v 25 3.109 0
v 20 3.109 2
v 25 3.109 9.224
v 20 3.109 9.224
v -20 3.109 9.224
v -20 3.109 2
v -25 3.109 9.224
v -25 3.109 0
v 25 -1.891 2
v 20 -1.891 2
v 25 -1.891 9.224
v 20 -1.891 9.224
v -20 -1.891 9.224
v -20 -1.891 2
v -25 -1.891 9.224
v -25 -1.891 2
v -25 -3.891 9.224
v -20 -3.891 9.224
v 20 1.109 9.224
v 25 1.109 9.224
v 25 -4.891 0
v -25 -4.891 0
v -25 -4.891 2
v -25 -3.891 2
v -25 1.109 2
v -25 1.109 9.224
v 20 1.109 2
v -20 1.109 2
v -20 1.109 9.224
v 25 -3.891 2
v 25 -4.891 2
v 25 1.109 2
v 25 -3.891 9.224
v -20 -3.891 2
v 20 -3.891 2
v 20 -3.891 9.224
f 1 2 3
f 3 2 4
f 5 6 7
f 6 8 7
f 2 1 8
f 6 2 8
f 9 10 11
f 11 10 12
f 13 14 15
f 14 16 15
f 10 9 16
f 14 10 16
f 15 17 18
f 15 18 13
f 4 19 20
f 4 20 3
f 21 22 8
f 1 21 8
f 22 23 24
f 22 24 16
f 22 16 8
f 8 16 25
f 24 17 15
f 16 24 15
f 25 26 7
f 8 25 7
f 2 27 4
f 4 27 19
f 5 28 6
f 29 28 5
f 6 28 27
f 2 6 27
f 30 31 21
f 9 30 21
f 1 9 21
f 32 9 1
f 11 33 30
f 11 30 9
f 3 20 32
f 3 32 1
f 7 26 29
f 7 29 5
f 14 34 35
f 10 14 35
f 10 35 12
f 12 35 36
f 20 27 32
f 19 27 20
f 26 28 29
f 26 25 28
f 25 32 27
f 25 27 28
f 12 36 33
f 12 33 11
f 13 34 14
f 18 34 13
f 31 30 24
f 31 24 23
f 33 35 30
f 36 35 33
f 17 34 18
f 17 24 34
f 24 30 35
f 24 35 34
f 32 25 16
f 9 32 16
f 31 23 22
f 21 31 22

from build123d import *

# Parameters (mm, degrees)
F0_W     = 2
F0_H     = 7.224001
F1_DEPTH = 50
F2_W     = 40
F2_H     = 10.308505
F3_DEPTH = 12.5


with BuildPart() as f1:
    # F0 (on Right) → F1 (new body)
    with BuildSketch(Plane.YZ):
        Polygon((-4.891242, 2), (-4.891242, 0), (3.108758, 0), (3.108758, 2), (1.108758, 2), (-1.891242, 2), (-3.891242, 2), align=None)
        with Locations((-2.891242, 5.612)):
            Rectangle(F0_W, F0_H)
        with Locations((2.108758, 5.612)):
            Rectangle(F0_W, F0_H)
    extrude(amount=F1_DEPTH)

    # F2 (on Front) → F3 (cut, symmetric)
    with BuildSketch(Plane.XZ):
        with Locations((25, 7.154253)):
            Rectangle(F2_W, F2_H)
    extrude(amount=F3_DEPTH, both=True, mode=Mode.SUBTRACT)


with BuildPart() as f1_1:
    # F4: moved
    add(f1.part.moved(Location((-25, 0, 0))))


solid = f1_1.part
